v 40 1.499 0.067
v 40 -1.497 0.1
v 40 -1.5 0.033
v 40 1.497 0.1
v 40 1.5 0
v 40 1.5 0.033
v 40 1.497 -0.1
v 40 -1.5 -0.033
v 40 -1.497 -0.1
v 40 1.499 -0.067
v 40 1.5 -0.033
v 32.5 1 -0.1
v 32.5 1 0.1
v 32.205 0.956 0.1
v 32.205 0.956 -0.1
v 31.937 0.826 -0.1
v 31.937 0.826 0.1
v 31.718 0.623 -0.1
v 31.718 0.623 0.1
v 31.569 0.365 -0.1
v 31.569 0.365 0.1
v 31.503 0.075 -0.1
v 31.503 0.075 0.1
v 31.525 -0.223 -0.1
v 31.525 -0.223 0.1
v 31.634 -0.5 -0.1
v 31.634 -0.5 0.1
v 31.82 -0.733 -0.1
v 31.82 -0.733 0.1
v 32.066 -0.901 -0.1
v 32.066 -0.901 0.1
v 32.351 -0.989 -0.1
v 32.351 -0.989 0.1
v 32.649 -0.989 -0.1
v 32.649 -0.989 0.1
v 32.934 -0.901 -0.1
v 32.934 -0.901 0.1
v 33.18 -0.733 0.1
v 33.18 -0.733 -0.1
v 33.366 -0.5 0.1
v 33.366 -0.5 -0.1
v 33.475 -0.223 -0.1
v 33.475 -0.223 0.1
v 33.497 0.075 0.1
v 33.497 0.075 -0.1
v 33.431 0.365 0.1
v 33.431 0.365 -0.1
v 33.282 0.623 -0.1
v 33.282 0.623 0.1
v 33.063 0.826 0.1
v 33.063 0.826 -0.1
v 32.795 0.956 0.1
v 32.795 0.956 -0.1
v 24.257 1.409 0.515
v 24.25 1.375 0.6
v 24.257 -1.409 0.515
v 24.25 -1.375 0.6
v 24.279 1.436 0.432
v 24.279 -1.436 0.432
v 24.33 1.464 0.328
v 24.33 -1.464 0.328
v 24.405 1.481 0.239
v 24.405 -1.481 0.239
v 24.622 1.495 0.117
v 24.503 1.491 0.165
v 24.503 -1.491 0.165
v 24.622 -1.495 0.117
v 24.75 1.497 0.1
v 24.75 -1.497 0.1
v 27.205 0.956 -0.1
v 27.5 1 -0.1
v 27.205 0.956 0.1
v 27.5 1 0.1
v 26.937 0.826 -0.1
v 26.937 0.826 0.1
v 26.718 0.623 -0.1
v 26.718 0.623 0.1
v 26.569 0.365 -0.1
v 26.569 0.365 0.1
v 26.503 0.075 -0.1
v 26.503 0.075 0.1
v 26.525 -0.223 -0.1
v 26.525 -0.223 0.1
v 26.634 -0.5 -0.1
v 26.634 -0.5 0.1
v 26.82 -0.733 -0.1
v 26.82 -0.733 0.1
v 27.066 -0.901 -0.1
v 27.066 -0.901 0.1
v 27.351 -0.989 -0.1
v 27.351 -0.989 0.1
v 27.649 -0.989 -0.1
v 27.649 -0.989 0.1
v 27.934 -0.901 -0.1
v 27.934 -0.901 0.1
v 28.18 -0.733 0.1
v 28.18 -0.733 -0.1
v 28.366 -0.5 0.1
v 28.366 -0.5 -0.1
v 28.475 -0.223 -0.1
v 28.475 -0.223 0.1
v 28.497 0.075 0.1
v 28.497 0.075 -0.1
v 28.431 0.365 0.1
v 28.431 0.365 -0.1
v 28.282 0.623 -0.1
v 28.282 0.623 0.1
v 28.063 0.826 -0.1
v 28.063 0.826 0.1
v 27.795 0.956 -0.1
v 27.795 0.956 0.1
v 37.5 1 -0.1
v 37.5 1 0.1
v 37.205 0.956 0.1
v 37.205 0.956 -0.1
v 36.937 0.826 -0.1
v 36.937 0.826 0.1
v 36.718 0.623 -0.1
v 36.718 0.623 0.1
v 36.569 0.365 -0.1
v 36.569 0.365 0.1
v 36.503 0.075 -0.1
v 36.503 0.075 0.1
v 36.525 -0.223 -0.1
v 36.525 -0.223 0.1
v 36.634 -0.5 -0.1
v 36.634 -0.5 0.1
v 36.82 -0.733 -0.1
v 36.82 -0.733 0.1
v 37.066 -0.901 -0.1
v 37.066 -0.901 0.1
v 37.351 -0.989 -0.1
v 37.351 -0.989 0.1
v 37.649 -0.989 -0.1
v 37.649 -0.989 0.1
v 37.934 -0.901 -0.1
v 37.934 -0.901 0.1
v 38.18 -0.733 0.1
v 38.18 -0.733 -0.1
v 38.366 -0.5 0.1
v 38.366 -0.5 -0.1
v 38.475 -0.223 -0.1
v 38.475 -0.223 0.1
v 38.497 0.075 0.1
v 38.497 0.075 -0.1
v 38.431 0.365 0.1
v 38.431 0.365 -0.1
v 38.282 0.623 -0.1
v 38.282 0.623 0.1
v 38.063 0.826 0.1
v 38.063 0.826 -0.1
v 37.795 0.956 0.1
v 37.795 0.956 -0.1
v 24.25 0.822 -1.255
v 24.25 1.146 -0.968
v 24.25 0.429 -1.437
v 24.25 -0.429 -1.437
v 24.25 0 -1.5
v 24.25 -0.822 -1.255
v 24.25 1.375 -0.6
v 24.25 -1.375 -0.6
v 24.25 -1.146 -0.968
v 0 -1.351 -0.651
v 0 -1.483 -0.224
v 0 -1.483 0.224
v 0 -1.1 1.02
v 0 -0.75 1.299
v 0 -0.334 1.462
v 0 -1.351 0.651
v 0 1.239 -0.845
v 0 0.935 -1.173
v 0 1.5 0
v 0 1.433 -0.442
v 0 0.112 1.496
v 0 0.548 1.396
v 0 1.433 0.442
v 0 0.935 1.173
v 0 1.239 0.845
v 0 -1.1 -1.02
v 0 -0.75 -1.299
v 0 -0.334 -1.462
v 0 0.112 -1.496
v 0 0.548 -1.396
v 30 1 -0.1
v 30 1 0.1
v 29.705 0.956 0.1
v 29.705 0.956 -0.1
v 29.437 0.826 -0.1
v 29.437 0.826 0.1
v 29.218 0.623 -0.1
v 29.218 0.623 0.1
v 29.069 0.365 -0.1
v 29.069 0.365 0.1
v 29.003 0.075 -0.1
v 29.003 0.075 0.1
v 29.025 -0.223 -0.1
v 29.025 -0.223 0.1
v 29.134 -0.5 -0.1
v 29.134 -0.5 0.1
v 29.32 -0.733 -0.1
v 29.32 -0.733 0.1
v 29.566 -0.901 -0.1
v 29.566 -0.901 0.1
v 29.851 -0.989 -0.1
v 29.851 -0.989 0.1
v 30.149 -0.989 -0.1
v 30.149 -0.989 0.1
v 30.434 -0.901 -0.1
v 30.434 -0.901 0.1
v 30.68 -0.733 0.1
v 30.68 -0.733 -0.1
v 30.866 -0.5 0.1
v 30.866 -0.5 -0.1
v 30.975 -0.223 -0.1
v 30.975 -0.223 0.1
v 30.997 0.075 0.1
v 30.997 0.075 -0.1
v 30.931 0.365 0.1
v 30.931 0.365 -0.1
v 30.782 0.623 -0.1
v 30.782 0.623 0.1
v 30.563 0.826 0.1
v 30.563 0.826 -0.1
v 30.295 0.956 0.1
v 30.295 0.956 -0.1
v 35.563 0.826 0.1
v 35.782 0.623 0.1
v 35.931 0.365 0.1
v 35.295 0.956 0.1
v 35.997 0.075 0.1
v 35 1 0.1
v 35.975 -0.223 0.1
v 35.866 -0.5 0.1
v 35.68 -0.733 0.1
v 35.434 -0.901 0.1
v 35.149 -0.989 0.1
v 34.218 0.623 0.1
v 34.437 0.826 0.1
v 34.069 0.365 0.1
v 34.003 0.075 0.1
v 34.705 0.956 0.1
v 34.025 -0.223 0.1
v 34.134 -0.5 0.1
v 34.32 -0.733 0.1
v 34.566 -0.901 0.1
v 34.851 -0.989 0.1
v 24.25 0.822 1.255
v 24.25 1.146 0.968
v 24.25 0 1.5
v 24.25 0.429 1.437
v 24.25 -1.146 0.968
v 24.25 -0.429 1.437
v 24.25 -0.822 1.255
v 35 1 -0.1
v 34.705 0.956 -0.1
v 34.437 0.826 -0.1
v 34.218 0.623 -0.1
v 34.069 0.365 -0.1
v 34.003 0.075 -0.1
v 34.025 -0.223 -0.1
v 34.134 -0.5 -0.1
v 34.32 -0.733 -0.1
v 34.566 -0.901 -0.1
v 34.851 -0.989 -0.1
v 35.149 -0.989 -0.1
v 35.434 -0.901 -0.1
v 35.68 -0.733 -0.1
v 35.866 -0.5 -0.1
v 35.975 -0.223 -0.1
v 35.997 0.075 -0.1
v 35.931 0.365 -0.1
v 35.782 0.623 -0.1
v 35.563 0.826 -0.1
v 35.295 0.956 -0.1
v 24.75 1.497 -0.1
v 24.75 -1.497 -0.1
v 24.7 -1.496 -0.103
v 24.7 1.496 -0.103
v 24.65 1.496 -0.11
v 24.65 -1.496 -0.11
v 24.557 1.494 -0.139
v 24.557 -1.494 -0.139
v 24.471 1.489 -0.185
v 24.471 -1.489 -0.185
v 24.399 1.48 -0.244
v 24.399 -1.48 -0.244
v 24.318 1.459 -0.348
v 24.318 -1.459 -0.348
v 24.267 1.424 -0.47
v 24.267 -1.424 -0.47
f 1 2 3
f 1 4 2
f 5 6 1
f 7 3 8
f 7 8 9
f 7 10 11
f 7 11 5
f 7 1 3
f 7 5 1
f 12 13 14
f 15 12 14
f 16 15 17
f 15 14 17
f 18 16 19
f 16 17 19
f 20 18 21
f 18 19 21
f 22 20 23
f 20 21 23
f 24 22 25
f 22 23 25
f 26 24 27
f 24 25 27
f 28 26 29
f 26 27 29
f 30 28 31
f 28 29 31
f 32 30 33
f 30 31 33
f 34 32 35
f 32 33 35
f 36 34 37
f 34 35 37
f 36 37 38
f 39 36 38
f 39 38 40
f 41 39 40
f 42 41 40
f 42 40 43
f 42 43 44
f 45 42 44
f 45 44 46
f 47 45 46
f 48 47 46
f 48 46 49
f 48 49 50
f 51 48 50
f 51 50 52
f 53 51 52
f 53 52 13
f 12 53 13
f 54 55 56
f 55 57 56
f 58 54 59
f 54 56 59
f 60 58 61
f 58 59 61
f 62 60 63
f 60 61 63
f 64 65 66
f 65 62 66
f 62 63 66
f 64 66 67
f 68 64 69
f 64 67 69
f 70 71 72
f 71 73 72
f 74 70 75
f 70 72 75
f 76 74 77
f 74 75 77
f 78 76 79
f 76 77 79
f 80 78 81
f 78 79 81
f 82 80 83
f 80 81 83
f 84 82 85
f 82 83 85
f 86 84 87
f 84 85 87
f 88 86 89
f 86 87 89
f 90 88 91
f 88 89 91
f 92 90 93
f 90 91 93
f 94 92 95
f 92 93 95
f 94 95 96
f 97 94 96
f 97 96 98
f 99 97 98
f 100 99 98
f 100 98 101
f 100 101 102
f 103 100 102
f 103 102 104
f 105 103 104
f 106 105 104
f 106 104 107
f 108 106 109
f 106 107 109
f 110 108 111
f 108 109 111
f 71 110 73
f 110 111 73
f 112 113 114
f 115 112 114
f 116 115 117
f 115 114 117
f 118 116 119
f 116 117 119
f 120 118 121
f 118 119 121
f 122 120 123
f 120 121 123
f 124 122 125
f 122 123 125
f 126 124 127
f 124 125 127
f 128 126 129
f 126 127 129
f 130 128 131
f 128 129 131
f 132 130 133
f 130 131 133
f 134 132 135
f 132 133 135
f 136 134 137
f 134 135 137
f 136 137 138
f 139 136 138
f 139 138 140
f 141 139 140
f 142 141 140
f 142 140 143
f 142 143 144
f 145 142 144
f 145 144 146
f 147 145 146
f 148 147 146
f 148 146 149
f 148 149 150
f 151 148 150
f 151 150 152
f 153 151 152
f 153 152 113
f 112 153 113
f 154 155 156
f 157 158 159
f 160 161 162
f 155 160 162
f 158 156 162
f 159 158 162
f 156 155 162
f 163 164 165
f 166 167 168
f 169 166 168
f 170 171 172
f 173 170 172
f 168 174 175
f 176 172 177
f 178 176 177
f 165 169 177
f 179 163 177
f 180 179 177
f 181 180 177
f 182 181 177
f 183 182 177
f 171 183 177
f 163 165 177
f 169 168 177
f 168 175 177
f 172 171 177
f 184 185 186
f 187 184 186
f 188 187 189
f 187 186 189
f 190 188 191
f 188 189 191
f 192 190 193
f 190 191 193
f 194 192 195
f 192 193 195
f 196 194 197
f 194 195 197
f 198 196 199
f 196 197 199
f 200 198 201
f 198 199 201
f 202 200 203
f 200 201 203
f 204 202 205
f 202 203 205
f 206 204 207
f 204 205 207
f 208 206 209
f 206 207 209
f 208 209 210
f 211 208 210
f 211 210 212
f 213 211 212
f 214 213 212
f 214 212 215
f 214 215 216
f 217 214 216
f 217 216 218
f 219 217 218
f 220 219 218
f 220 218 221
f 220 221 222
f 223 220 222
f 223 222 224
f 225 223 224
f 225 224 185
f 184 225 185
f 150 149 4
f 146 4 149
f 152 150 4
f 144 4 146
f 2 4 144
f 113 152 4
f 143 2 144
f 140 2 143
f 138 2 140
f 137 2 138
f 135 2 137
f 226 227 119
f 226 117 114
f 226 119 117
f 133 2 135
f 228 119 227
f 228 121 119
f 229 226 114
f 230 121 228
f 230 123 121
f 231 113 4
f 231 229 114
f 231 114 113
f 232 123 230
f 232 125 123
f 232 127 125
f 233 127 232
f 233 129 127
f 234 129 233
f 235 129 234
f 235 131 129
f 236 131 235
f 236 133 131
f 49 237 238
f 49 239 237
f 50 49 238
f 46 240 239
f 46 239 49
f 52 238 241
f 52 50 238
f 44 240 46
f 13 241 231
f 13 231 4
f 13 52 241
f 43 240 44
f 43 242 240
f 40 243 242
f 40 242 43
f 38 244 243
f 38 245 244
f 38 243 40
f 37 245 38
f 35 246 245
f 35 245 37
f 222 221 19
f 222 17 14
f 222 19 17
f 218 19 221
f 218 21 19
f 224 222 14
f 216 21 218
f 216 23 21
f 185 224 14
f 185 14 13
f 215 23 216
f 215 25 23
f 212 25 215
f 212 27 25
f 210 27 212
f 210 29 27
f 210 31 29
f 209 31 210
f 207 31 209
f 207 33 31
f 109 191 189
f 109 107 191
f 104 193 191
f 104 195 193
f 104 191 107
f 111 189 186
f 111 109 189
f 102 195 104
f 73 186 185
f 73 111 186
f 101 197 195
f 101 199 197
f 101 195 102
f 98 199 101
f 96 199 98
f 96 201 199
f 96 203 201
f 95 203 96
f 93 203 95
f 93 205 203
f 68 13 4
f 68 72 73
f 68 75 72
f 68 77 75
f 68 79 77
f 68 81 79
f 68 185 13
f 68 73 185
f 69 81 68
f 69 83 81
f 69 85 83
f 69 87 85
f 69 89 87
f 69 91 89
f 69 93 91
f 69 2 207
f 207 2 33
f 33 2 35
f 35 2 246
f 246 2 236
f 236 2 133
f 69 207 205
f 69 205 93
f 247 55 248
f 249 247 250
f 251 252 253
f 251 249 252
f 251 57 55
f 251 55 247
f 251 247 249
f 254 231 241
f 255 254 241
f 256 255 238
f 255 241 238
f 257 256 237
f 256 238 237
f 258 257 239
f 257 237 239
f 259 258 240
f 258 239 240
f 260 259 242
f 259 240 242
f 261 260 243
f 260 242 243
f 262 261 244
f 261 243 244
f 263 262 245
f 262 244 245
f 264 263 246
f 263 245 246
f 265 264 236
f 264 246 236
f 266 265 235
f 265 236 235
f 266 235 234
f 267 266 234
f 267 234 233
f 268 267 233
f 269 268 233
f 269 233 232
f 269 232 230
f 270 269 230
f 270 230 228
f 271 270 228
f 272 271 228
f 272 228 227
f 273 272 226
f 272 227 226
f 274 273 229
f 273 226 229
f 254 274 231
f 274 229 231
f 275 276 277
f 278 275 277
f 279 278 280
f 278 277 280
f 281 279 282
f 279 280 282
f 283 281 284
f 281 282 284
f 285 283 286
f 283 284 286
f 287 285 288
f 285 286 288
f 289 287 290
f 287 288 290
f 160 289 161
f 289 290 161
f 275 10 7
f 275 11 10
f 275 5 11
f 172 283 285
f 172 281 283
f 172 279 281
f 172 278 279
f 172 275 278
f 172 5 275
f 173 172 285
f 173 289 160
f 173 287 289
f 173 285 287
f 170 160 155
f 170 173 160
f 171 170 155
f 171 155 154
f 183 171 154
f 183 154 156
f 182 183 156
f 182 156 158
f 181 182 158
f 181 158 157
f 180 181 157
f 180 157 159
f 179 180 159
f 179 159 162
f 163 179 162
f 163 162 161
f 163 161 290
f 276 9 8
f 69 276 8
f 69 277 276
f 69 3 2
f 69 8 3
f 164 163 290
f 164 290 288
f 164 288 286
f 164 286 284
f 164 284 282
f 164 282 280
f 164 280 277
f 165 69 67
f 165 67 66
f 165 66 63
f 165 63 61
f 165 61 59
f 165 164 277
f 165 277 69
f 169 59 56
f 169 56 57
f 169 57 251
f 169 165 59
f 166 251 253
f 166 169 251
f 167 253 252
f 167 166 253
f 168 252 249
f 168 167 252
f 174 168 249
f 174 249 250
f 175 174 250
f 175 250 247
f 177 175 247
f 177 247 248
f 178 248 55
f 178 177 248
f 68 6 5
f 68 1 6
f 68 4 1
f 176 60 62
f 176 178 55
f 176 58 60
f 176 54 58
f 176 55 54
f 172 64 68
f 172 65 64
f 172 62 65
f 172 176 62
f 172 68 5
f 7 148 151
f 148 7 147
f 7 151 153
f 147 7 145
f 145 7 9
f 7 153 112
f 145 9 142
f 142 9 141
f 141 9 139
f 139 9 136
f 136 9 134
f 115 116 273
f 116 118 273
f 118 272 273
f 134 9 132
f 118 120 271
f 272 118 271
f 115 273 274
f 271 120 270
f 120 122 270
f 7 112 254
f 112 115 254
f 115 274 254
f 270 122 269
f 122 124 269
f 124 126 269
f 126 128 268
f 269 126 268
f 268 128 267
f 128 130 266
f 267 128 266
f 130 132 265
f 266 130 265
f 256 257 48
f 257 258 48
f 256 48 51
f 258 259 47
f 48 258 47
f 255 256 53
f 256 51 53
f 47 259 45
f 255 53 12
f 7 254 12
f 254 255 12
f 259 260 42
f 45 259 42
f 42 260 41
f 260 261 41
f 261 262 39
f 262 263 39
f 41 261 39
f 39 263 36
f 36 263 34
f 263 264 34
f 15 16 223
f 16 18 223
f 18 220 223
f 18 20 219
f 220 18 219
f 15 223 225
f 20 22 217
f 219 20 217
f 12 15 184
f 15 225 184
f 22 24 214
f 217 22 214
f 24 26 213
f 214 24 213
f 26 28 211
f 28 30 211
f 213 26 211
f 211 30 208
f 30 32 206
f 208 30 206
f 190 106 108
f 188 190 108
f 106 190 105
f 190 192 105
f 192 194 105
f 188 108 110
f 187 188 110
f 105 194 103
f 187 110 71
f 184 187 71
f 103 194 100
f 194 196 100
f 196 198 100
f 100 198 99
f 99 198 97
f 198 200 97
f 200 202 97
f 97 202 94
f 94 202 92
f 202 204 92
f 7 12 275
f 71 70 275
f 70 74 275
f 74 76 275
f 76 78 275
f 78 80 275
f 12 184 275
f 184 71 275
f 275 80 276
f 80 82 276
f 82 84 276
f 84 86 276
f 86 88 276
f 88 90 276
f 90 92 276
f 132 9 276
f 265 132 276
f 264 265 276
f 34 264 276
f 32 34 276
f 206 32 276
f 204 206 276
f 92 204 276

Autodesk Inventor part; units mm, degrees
ref_plane "YZ Plane" through (0, 0, 0) normal (1, 0, 0) x (0, 1, 0)
sketch "Sketch1" plane through (0, 0, 0) normal (1, 0, 0) x (0, 1, 0)
  circle A0 centre (0, 0) radius 1.5
  dimension "d0" = 3
extrude "Extrusion1" add sketch "Sketch1" along normal blind 71
ref_plane "Work Plane1" through (0, 0, -1.5) normal (0, 0, 1) x (1, 0, 0)
sketch "Sketch3" plane through (0, 0, -1.5) normal (0, 0, 1) x (1, 0, 0)
  line L0 (-14.2, 0) -> (85.2, 0) construction
  line L1 (0, -1.5) -> (0, 1.5) construction
  point P0 (0, 0)
  point P1 (27.5, 0)
  dimension "d16" = 27.5
hole "Hole1" at (27.5, 0, -1.5) direction (0, 0, 1) diameter 2 end through all
pattern_linear "Rectangular Pattern1" count 5 spacing 2.5 along (1, 0, 0) of "Hole1"
sketch "Sketch2" plane through (0, 0, 0) normal (0, 1, 0) x (-1, 0, 0)
  line L0 (-71, 1.5) -> (-71, -1.5) construction
  line L1 (0, 1.5) -> (0, -1.5) construction
  line L2 (-24.25, 1.5) -> (-40.75, 1.5)
  line L3 (-40.75, 1.5) -> (-40.75, 0.6)
  line L4 (-40.25, 0.1) -> (-24.75, 0.1)
  line L5 (-24.25, 0.6) -> (-24.25, 1.5)
  line L6 (-24.25, -1.5) -> (-40.75, -1.5)
  line L7 (-40.75, -1.5) -> (-40.75, -0.6)
  line L8 (-40.25, -0.1) -> (-24.75, -0.1)
  line L9 (-24.25, -0.6) -> (-24.25, -1.5)
  line L10 (0, 1.5) -> (-71, 1.5) construction
  line L11 (0, -1.5) -> (-71, -1.5) construction
  line L12 (13.2, 0) -> (-79.2, 0) construction
  arc A0 (-24.75, 0.1) -> (-24.25, 0.6) centre (-24.75, 0.6) ccw
  arc A1 (-40.75, 0.6) -> (-40.25, 0.1) centre (-40.25, 0.6) ccw
  arc A2 (-24.25, -0.6) -> (-24.75, -0.1) centre (-24.75, -0.6) ccw
  arc A3 (-40.25, -0.1) -> (-40.75, -0.6) centre (-40.25, -0.6) ccw
  point P0 (0, 0)
  dimension "d3" = 0.5
  dimension "d4" = 0.2
  dimension "d20" = 16.5
  dimension "d21" = 24.25
extrude "Extrusion2" cut sketch "Sketch2" along normal through all both and the other way through all
ref_plane "Work Plane2" through (0, 0, 0) normal (0, 0.7071, 0.7071) x (1, 0, 0)
sketch "Sketch4" plane through (0, 0, 0) normal (0, 0.7071, 0.7071) x (1, 0, 0)
  line L0 (26.9374, -0.3516) -> (28.0626, -0.3516)
  line L1 (28.0626, -0.3516) -> (28.0626, 0.3516)
  line L2 (28.0626, 0.3516) -> (26.9374, 0.3516)
  line L3 (26.9374, 0.3516) -> (26.9374, -0.3516)
  line L4 (26.9374, -0.3516) -> (28.0626, 0.3516) construction
  line L5 (28.0626, -0.3516) -> (26.9374, 0.3516) construction
  line L6 (26.7934, -0.5175) -> (28.2066, -0.5175)
  line L7 (28.2066, -0.5175) -> (28.2066, 0.5175)
  line L8 (28.2066, 0.5175) -> (26.7934, 0.5175)
  line L9 (26.7934, 0.5175) -> (26.7934, -0.5175)
  line L10 (26.7934, -0.5175) -> (28.2066, 0.5175) construction
  line L11 (28.2066, -0.5175) -> (26.7934, 0.5175) construction
  line L12 (27.1467, -0.2588) -> (27.8533, -0.2588)
  line L13 (27.8533, -0.2588) -> (27.8533, 0.2587)
  line L14 (27.8533, 0.2587) -> (27.1467, 0.2587)
  line L15 (27.1467, 0.2587) -> (27.1467, -0.2588)
  line L16 (27.1467, -0.2588) -> (27.8533, 0.2587) construction
  line L17 (27.8533, -0.2588) -> (27.1467, 0.2587) construction
  line L18 (-5.7, 0) -> (34.2, 0) construction
  ellipse E0 centre (27.5, -0.0707) end of major axis (28.5, -0.0707) minor radius 0.7071 construction
  ellipse E1 centre (27.5, 0.0707) end of major axis (28.5, 0.0707) minor radius 0.7071 construction
  line L19 (27.5, -0.0707) -> (27.5, 0.0707) construction
  point P0 (0, 0)
  point P1 (27.5, 0)
  dimension "d23" = 0.7032
  dimension "d24" = 1.1251
  dimension "d25" = 1.4131
  dimension "d26" = 1.035
  dimension "d27" = 0.5175
  dimension "d28" = 0.7066
sketch "Sketch5" plane through (71, 0, 0) normal (1, 0, 0) x (0, 0, -1)
  circle A0 centre (0, 0) radius 1.5 projected
extrude "Extrusion3" cut sketch "Sketch5" against normal blind 31
equation "\"d16\" = DistanceHoleEnd"
equation "\"d9\" = DiameterHole"
equation "\"d19\" = DistanceHoleHole"
equation "\"d4\" = Thickness"
equation "\"DistanceHoleHole\" = 2.5"
equation "\"DiameterHole\" = 2"
equation "\"DistanceHoleEnd\" = 27.5"
equation "\"Thickness\" = 0.2"
properties part number "5_multi_beetle_holder"
